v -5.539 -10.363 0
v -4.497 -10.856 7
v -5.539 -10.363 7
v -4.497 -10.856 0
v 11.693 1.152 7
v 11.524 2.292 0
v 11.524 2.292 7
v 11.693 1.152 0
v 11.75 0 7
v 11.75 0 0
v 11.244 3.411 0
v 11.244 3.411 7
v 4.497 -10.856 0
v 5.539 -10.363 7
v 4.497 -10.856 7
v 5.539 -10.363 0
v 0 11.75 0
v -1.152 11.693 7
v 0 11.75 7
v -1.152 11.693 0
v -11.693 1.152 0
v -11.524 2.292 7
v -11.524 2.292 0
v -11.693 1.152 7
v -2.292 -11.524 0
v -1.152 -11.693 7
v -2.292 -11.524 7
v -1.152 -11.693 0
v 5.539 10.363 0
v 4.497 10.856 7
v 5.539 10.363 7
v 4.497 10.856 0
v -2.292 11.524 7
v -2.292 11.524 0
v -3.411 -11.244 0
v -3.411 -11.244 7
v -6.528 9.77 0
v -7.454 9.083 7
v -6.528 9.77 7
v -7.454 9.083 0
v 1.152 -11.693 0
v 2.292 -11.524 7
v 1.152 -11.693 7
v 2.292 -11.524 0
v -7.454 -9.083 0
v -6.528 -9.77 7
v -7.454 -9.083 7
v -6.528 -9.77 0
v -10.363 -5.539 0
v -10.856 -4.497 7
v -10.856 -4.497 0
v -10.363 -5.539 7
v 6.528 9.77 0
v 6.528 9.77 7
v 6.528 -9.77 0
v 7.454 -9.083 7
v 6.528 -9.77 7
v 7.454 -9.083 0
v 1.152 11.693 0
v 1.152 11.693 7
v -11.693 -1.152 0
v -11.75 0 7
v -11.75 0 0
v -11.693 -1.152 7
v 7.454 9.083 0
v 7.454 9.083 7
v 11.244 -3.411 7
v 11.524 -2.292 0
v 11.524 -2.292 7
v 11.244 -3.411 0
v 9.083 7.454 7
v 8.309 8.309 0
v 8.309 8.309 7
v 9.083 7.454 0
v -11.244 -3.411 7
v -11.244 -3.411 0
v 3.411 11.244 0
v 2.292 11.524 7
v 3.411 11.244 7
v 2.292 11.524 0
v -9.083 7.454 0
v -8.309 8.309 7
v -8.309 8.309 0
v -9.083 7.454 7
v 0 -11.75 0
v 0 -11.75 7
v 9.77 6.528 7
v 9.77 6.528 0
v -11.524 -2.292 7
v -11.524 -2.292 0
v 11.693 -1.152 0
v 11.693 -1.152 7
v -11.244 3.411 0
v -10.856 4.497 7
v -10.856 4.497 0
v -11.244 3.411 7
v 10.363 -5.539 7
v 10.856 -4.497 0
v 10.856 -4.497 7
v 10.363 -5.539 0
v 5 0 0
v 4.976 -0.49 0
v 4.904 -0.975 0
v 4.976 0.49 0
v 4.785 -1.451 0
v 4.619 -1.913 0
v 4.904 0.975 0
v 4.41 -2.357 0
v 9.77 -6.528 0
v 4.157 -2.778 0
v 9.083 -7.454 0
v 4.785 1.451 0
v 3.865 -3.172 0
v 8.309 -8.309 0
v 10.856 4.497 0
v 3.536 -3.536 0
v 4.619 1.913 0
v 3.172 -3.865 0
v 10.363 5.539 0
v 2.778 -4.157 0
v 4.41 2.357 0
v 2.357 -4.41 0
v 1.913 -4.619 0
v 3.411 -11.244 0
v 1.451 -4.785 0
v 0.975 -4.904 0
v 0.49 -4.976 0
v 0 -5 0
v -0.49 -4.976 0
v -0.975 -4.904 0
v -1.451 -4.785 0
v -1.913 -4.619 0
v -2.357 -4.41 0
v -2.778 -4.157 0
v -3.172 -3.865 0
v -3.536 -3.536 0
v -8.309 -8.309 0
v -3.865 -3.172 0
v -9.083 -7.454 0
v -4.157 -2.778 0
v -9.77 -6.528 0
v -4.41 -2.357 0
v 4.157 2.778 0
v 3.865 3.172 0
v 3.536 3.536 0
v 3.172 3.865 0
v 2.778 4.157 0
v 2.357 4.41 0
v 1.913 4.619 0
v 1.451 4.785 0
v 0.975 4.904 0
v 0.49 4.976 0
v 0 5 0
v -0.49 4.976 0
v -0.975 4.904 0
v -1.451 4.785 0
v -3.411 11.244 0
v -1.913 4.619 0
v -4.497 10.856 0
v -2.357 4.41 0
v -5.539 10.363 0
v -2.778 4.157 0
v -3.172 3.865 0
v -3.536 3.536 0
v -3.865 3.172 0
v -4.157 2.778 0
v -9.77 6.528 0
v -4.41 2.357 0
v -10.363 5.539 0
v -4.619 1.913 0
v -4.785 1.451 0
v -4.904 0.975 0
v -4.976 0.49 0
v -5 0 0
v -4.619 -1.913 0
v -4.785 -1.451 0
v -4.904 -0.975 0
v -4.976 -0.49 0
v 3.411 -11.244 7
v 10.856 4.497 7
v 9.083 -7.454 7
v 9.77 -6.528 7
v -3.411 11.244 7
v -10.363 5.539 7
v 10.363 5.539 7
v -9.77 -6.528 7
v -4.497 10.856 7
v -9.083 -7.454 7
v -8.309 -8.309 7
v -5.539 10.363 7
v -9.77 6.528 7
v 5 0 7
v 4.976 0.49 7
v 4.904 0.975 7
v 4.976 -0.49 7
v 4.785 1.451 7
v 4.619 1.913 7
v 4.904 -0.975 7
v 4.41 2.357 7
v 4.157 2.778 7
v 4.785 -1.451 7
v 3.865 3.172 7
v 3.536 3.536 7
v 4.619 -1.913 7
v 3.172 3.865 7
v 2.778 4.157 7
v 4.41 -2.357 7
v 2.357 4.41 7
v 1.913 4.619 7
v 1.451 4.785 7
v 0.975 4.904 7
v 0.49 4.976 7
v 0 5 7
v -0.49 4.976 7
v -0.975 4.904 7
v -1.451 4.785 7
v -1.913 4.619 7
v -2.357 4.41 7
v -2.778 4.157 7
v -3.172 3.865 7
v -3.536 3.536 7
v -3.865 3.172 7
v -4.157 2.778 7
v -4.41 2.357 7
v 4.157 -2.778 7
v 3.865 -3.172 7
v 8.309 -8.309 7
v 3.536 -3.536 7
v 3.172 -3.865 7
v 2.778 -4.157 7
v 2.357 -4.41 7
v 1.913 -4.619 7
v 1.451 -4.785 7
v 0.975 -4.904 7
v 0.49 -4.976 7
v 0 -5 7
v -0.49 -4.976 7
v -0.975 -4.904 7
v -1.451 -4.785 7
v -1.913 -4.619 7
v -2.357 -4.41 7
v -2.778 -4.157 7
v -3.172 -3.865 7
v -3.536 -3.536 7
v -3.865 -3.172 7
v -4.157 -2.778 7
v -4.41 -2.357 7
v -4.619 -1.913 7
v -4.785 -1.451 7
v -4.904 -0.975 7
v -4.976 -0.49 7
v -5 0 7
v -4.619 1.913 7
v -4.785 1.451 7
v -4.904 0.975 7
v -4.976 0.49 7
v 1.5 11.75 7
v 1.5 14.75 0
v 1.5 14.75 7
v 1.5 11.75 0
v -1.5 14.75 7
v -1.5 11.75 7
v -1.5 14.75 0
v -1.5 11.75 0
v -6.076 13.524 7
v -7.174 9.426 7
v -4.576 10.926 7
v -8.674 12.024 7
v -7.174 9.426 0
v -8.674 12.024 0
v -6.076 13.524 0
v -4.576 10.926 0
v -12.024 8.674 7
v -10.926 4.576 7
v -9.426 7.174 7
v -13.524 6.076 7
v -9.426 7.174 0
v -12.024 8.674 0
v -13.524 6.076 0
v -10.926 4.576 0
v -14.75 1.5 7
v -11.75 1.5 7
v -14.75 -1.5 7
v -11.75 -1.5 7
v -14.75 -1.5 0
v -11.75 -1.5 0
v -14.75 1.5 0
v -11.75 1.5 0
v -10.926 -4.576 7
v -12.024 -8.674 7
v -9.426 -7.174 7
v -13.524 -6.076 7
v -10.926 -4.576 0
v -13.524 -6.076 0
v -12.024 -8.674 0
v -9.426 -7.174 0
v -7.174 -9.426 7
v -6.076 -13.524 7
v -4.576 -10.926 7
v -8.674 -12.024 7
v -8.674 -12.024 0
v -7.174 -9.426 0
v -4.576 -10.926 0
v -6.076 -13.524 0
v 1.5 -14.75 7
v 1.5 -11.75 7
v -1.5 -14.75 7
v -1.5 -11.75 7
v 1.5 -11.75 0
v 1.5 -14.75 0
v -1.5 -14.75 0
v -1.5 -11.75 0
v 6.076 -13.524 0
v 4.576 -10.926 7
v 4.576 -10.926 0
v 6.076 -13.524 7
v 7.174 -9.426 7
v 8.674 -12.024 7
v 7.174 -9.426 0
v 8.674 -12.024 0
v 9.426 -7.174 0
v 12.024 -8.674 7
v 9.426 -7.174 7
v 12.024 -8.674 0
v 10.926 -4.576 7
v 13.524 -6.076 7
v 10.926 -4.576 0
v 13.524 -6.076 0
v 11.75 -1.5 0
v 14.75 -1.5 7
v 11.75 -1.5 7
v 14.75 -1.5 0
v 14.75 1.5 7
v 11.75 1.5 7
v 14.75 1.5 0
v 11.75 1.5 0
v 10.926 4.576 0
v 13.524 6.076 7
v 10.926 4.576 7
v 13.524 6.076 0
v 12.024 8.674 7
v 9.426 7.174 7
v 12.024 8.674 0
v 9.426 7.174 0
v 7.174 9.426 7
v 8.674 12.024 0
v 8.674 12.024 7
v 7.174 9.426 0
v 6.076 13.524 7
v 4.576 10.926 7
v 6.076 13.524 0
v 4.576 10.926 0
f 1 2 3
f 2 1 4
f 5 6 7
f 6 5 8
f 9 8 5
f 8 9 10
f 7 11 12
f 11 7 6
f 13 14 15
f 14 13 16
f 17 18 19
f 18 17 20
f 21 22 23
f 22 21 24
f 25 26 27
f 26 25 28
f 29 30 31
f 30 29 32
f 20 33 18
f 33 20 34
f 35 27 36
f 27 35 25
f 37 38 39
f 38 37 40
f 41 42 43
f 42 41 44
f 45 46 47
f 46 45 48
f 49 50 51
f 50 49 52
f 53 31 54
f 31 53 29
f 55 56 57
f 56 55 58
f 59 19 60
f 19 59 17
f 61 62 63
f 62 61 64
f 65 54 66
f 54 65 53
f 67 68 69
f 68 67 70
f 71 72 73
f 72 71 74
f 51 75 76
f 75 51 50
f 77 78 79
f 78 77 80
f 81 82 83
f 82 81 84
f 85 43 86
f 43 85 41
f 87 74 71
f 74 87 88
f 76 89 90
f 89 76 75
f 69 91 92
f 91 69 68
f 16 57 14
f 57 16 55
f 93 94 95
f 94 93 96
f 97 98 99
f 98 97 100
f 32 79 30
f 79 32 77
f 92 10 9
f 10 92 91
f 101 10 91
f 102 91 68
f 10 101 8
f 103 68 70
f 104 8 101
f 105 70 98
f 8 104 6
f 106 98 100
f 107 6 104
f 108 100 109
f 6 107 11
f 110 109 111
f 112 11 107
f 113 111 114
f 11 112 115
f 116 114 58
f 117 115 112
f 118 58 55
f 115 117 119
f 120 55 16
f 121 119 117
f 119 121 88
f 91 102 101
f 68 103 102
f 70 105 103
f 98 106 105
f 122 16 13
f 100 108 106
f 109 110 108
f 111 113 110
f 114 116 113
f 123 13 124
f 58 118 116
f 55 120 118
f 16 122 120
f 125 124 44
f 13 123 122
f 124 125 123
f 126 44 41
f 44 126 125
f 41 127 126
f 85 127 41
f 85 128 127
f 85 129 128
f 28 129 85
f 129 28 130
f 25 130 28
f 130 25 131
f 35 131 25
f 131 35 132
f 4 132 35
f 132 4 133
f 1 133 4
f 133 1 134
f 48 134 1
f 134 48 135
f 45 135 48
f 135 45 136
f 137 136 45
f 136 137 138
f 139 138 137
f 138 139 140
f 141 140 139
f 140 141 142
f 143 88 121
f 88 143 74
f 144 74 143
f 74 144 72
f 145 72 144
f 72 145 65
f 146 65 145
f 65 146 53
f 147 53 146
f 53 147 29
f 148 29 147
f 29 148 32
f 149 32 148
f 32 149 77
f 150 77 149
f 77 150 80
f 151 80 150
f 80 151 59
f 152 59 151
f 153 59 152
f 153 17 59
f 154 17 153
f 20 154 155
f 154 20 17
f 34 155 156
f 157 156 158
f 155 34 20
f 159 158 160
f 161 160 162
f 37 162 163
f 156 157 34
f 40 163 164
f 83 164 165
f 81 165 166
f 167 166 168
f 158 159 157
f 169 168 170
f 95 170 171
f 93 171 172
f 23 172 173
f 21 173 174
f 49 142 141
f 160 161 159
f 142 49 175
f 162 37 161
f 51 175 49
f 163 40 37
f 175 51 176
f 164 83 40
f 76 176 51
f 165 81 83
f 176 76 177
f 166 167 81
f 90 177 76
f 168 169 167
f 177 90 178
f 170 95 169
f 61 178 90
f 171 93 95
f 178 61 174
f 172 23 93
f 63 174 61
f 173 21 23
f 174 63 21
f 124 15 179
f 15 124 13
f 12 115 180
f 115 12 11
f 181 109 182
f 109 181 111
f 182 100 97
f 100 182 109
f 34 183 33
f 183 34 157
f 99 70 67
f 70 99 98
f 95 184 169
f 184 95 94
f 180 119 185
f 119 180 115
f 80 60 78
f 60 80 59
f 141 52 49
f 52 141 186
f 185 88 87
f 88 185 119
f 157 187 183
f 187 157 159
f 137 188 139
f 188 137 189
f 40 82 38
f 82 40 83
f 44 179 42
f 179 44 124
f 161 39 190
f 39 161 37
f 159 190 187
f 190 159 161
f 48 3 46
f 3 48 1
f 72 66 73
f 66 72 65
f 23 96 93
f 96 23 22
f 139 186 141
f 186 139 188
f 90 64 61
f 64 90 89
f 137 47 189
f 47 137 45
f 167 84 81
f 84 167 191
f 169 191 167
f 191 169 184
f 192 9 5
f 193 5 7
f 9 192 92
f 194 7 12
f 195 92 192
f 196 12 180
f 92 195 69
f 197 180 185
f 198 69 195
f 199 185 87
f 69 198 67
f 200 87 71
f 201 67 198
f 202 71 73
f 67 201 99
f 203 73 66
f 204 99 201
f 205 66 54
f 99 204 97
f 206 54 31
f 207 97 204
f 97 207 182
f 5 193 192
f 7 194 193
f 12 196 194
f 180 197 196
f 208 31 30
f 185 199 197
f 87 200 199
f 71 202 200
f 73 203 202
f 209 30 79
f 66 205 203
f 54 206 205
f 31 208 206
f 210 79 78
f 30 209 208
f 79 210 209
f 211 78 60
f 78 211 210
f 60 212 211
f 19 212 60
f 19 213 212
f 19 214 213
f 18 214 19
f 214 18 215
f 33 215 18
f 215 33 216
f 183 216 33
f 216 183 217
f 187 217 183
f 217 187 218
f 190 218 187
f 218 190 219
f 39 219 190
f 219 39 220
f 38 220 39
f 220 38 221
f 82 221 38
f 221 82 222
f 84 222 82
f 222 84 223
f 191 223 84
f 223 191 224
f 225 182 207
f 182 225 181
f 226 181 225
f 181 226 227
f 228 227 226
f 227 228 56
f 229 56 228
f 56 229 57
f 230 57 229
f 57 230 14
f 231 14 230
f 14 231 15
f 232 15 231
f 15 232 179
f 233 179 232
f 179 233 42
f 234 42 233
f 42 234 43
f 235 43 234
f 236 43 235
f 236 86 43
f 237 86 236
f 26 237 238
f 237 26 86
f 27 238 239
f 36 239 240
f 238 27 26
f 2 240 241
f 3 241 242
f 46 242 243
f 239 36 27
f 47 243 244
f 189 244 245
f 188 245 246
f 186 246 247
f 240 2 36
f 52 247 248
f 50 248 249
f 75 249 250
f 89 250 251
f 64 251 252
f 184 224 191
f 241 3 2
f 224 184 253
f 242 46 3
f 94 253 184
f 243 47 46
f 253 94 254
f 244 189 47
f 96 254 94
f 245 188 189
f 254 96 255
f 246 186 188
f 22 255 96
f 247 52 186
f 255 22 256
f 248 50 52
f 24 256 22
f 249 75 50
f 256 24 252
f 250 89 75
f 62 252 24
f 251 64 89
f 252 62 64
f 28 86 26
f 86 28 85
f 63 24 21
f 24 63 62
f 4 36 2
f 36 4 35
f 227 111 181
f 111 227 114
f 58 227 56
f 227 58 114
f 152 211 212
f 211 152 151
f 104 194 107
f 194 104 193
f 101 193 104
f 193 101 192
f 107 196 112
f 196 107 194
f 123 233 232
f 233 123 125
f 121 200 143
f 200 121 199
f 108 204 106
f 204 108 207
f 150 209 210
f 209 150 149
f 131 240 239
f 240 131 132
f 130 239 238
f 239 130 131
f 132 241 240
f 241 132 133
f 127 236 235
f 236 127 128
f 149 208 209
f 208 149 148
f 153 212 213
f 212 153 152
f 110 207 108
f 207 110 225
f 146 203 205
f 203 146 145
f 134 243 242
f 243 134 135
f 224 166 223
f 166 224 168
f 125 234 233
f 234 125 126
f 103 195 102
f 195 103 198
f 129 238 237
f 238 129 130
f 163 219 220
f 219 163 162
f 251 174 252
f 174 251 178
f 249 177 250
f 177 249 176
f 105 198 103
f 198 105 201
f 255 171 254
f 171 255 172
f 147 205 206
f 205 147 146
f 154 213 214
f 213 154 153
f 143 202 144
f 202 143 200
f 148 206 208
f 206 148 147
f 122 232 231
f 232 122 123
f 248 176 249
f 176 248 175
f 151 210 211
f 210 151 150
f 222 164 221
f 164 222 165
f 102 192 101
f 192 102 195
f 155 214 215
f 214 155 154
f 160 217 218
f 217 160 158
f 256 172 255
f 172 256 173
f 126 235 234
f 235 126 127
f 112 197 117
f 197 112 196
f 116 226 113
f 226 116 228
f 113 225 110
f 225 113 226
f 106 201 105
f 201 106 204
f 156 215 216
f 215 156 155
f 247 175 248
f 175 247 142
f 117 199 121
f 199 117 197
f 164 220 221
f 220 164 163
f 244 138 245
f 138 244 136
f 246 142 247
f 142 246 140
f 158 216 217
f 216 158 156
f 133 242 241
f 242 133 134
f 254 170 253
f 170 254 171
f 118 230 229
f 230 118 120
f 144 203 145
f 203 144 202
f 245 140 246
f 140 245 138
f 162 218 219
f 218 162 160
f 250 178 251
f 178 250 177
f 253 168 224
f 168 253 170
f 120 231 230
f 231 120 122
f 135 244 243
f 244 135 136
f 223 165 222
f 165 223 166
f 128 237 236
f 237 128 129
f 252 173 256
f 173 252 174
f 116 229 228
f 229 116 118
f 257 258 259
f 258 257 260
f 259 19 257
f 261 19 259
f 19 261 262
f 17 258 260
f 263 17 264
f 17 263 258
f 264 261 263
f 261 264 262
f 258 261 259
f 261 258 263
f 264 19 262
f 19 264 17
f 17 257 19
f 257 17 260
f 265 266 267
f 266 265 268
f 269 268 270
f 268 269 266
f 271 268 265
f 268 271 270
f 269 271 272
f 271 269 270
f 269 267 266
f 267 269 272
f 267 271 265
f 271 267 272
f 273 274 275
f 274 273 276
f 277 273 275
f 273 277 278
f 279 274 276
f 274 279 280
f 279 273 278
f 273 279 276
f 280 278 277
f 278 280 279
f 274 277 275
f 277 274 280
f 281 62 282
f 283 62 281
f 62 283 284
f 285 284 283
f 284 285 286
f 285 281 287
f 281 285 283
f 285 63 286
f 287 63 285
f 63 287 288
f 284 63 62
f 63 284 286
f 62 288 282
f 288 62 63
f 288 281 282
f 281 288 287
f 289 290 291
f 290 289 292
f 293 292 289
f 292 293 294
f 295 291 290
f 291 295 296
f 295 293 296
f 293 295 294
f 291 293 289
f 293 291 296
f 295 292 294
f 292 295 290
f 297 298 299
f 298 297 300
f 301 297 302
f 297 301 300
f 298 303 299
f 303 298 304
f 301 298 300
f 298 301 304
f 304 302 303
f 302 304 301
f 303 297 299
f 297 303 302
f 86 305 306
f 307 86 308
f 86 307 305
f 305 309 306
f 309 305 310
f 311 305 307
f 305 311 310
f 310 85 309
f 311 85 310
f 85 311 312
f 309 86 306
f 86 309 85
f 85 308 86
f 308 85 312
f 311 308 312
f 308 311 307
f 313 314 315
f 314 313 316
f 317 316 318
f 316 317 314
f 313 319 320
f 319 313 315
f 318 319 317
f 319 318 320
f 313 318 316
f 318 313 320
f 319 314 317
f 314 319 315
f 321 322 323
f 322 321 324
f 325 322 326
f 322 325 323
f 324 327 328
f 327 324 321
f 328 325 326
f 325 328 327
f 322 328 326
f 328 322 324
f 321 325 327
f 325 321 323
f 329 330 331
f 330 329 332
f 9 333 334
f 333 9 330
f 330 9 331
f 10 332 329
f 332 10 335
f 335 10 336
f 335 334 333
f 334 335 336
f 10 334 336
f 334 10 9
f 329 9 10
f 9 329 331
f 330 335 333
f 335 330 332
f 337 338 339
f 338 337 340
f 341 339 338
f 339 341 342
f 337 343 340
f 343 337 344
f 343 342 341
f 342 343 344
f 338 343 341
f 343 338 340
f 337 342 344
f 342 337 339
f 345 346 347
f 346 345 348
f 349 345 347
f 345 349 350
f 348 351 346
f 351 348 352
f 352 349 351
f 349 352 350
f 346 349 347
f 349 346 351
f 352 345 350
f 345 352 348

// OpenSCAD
module annular_ring_with_teeth() {
    difference() {
        // Main ring
        cylinder(h=7, r=11.75, $fn=64);
        
        // Central bore
        translate([0, 0, -1])
            cylinder(h=9, r=5, $fn=64);
    }
}

module tooth() {
    translate([-1.5, 11.75, 0])
        cube([3, 3, 7]);
}

module ring_with_teeth() {
    annular_ring_with_teeth();
    for (i = [0:11]) {
        rotate([0, 0, i * 30])
            tooth();
    }
}

ring_with_teeth();
